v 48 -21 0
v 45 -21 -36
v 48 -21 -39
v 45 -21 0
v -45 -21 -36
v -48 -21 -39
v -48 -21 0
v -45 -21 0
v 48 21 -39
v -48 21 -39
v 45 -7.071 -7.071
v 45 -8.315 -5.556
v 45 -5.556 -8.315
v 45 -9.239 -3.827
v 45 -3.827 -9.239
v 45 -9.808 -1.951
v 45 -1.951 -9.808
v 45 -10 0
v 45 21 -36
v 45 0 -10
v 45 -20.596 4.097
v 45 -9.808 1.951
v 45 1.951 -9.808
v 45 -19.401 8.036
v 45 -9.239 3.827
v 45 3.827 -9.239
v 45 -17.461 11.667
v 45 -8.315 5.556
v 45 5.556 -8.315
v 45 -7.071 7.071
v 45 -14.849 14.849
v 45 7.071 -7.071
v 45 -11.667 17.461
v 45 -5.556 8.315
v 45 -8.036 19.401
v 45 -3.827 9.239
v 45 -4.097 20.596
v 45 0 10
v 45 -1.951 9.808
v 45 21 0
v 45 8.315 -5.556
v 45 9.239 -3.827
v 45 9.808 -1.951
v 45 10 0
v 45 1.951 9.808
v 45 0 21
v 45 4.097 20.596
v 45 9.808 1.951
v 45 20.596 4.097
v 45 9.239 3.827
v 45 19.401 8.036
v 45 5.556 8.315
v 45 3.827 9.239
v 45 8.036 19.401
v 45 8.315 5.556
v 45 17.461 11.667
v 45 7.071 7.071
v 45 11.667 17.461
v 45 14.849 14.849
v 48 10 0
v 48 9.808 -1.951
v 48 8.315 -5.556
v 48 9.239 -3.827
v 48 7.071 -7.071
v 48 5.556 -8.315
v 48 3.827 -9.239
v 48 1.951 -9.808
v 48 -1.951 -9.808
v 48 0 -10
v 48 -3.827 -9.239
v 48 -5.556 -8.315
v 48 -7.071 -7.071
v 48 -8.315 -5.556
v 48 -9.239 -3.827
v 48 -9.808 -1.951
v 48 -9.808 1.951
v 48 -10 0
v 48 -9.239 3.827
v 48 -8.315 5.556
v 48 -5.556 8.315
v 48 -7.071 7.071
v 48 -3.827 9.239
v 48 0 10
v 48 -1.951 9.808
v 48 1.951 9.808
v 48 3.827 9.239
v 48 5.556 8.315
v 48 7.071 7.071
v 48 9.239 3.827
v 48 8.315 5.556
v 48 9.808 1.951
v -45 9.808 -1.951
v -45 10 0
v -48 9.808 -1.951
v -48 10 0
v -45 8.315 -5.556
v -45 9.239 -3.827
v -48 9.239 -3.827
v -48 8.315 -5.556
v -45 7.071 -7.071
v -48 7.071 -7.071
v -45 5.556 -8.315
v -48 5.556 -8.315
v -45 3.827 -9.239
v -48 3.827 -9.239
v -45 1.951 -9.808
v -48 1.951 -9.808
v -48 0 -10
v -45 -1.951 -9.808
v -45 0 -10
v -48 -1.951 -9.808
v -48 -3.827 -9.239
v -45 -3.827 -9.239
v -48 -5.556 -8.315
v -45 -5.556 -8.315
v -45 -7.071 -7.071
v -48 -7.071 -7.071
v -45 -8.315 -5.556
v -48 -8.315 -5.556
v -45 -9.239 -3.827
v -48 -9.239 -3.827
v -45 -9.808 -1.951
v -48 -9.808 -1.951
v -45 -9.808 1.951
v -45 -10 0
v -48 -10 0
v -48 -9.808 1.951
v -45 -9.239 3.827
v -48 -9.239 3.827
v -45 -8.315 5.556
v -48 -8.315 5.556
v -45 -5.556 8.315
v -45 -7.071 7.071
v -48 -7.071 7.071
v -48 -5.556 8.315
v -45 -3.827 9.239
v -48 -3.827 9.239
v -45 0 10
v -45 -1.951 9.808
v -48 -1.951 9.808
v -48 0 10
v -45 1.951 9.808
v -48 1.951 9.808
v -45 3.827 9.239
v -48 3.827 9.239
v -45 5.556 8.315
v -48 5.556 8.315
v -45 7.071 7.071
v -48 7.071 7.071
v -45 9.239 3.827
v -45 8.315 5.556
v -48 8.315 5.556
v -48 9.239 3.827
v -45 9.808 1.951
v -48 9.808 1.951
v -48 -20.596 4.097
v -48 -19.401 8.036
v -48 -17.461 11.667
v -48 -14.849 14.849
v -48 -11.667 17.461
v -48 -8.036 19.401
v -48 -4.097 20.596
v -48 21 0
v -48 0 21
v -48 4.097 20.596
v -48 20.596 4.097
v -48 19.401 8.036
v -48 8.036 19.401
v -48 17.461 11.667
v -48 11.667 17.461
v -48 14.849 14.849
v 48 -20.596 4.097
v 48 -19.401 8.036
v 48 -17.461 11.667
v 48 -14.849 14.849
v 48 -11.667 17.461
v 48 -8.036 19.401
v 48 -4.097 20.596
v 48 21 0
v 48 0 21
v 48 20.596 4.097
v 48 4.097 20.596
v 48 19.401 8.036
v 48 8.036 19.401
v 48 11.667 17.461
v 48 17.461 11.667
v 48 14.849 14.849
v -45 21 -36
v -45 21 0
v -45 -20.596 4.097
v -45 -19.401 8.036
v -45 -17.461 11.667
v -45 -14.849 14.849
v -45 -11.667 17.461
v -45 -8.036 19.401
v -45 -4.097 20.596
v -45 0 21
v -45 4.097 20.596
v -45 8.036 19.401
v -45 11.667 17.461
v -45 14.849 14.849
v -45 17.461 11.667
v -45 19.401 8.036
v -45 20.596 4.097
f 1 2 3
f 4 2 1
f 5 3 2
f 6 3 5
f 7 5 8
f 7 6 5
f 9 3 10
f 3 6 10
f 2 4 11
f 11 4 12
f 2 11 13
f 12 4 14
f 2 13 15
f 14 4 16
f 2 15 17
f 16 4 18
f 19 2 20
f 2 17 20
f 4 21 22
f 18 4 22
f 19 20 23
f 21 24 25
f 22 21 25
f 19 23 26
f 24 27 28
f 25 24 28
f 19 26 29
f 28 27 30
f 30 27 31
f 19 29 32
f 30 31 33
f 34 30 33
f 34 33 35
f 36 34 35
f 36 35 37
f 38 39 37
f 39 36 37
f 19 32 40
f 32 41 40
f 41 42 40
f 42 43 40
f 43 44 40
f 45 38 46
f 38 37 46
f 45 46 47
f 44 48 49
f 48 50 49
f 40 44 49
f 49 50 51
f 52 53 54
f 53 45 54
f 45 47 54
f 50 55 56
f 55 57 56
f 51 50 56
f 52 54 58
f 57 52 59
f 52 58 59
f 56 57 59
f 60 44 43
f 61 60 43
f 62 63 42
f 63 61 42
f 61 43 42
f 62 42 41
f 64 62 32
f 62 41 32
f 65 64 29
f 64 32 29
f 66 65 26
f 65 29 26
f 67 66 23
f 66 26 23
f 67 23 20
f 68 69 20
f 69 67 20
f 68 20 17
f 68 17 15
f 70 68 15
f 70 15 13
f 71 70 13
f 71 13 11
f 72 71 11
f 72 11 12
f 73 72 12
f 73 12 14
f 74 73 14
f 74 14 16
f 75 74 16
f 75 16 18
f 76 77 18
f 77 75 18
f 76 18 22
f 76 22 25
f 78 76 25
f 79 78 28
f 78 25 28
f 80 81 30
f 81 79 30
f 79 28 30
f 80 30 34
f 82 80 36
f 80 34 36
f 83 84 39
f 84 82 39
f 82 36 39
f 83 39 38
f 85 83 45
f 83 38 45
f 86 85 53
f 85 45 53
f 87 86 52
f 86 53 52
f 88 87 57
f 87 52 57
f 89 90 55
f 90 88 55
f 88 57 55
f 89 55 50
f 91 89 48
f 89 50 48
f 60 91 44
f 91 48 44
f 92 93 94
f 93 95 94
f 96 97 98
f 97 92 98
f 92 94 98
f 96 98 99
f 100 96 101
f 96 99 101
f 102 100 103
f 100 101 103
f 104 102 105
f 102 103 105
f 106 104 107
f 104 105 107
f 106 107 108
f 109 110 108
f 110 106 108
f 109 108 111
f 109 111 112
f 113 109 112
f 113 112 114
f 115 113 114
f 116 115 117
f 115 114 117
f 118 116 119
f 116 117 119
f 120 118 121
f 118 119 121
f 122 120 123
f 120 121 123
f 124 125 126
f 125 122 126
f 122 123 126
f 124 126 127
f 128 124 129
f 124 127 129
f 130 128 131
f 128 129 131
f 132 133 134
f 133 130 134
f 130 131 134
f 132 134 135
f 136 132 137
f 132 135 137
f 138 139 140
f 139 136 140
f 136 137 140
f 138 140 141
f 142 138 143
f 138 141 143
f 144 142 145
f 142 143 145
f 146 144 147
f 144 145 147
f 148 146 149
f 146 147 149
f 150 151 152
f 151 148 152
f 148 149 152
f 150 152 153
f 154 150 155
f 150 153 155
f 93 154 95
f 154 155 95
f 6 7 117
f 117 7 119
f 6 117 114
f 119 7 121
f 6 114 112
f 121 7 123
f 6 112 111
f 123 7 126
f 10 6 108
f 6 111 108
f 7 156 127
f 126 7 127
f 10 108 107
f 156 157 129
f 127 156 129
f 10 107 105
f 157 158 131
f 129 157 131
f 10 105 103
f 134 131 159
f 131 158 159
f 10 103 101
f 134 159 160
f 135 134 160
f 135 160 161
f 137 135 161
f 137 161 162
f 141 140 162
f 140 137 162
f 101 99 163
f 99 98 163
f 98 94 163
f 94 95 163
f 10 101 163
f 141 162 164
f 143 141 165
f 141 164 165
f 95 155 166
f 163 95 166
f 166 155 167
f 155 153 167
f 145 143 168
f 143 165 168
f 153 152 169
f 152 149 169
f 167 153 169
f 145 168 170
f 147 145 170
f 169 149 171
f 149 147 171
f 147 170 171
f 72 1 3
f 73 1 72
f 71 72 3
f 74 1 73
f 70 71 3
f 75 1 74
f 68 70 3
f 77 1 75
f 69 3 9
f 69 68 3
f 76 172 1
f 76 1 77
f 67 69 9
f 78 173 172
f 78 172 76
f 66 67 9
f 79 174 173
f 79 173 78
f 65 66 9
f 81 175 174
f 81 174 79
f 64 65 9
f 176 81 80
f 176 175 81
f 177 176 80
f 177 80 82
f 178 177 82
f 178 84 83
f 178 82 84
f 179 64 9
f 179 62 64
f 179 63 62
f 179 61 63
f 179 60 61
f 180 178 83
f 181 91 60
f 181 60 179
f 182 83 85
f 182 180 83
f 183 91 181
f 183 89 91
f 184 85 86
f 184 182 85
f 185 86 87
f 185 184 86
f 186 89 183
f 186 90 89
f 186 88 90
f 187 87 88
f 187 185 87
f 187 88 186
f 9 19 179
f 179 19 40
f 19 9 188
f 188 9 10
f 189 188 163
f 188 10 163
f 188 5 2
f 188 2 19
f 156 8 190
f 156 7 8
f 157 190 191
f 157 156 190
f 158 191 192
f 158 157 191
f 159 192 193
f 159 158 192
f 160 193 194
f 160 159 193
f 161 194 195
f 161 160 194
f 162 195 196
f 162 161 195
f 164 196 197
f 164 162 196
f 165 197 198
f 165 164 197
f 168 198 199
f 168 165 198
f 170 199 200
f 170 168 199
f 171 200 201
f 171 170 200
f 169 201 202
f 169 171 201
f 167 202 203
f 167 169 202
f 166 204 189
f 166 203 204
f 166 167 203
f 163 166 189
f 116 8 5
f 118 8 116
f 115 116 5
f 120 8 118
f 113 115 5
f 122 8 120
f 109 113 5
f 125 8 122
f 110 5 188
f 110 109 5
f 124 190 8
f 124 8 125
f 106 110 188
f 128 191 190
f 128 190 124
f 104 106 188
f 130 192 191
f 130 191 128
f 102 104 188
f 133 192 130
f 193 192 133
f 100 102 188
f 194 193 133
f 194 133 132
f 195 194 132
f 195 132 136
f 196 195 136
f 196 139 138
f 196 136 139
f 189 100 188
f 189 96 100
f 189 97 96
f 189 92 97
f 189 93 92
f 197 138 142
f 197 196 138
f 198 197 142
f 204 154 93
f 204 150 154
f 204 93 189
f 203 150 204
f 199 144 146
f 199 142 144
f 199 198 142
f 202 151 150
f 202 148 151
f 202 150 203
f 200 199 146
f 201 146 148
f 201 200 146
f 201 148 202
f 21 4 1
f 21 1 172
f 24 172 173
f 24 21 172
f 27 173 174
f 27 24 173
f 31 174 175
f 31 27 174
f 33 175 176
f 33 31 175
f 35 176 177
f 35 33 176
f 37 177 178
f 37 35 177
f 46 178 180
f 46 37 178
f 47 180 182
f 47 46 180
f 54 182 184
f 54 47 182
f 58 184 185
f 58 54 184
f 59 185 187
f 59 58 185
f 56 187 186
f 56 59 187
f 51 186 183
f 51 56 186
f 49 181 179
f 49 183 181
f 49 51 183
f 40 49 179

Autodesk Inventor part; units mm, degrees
ref_plane "YZ Plane" through (0, 0, 0) normal (1, 0, 0) x (0, 1, 0)
ref_plane "XZ Plane" through (0, 0, 0) normal (0, 1, 0) x (-1, 0, 0)
ref_plane "XY Plane" through (0, 0, 0) normal (0, 0, 1) x (1, 0, 0)
sketch "Sketch1" plane through (0, 0, 0) normal (0, 0, 1) x (1, 0, 0)
  circle A0 centre (0, 0) radius 10
  arc A1 (21, 0) -> (-21, 0) centre (0, 0) ccw
  line L0 (0, 0) -> (0, -39) construction
  line L1 (0, -39) -> (21, -39)
  line L2 (0, -39) -> (-21, -39)
  line L3 (-21, -39) -> (-21, 0)
  line L4 (21, -39) -> (21, 0)
  dimension "d0" = 20
  dimension "d2" = 42
  dimension "d3" = 21
  dimension "d4" = 39
extrude "Extrusion1" add sketch "Sketch1" along normal mid plane 96
sketch "Sketch2" plane through (0, 0, 0) normal (0, 0, 1) x (1, 0, 0)
  circle A0 centre (0, 0) radius 10 projected
  line L0 (-21, -39) -> (21, -39) projected
  line L1 (21, -39) -> (21, 0) projected
  arc A1 (21, 0) -> (-21, 0) centre (0, 0) ccw projected
  line L2 (-21, 0) -> (-21, -39) projected
  line L3 (-21, -36) -> (21, -36)
  line L4 (21, -36) -> (21, 0)
  line L5 (-21, -31.2069) -> (-21, 0)
  dimension "d7" = 3
extrude "Extrusion2" cut sketch "Sketch2" along normal mid plane 90 contours L2 A1 L1 L3
move or copy body "Move Body1" bodies to move or copy 1 copy no rotation origin (0, 0, 0) rotation axis (1, 0, 0) rotation angle 90
move or copy body "Move Body2" bodies to move or copy 1 copy no rotation origin (0, 0, 0) rotation axis (0, 0, 1) rotation angle 90
properties part number "Wrist_Roll"
